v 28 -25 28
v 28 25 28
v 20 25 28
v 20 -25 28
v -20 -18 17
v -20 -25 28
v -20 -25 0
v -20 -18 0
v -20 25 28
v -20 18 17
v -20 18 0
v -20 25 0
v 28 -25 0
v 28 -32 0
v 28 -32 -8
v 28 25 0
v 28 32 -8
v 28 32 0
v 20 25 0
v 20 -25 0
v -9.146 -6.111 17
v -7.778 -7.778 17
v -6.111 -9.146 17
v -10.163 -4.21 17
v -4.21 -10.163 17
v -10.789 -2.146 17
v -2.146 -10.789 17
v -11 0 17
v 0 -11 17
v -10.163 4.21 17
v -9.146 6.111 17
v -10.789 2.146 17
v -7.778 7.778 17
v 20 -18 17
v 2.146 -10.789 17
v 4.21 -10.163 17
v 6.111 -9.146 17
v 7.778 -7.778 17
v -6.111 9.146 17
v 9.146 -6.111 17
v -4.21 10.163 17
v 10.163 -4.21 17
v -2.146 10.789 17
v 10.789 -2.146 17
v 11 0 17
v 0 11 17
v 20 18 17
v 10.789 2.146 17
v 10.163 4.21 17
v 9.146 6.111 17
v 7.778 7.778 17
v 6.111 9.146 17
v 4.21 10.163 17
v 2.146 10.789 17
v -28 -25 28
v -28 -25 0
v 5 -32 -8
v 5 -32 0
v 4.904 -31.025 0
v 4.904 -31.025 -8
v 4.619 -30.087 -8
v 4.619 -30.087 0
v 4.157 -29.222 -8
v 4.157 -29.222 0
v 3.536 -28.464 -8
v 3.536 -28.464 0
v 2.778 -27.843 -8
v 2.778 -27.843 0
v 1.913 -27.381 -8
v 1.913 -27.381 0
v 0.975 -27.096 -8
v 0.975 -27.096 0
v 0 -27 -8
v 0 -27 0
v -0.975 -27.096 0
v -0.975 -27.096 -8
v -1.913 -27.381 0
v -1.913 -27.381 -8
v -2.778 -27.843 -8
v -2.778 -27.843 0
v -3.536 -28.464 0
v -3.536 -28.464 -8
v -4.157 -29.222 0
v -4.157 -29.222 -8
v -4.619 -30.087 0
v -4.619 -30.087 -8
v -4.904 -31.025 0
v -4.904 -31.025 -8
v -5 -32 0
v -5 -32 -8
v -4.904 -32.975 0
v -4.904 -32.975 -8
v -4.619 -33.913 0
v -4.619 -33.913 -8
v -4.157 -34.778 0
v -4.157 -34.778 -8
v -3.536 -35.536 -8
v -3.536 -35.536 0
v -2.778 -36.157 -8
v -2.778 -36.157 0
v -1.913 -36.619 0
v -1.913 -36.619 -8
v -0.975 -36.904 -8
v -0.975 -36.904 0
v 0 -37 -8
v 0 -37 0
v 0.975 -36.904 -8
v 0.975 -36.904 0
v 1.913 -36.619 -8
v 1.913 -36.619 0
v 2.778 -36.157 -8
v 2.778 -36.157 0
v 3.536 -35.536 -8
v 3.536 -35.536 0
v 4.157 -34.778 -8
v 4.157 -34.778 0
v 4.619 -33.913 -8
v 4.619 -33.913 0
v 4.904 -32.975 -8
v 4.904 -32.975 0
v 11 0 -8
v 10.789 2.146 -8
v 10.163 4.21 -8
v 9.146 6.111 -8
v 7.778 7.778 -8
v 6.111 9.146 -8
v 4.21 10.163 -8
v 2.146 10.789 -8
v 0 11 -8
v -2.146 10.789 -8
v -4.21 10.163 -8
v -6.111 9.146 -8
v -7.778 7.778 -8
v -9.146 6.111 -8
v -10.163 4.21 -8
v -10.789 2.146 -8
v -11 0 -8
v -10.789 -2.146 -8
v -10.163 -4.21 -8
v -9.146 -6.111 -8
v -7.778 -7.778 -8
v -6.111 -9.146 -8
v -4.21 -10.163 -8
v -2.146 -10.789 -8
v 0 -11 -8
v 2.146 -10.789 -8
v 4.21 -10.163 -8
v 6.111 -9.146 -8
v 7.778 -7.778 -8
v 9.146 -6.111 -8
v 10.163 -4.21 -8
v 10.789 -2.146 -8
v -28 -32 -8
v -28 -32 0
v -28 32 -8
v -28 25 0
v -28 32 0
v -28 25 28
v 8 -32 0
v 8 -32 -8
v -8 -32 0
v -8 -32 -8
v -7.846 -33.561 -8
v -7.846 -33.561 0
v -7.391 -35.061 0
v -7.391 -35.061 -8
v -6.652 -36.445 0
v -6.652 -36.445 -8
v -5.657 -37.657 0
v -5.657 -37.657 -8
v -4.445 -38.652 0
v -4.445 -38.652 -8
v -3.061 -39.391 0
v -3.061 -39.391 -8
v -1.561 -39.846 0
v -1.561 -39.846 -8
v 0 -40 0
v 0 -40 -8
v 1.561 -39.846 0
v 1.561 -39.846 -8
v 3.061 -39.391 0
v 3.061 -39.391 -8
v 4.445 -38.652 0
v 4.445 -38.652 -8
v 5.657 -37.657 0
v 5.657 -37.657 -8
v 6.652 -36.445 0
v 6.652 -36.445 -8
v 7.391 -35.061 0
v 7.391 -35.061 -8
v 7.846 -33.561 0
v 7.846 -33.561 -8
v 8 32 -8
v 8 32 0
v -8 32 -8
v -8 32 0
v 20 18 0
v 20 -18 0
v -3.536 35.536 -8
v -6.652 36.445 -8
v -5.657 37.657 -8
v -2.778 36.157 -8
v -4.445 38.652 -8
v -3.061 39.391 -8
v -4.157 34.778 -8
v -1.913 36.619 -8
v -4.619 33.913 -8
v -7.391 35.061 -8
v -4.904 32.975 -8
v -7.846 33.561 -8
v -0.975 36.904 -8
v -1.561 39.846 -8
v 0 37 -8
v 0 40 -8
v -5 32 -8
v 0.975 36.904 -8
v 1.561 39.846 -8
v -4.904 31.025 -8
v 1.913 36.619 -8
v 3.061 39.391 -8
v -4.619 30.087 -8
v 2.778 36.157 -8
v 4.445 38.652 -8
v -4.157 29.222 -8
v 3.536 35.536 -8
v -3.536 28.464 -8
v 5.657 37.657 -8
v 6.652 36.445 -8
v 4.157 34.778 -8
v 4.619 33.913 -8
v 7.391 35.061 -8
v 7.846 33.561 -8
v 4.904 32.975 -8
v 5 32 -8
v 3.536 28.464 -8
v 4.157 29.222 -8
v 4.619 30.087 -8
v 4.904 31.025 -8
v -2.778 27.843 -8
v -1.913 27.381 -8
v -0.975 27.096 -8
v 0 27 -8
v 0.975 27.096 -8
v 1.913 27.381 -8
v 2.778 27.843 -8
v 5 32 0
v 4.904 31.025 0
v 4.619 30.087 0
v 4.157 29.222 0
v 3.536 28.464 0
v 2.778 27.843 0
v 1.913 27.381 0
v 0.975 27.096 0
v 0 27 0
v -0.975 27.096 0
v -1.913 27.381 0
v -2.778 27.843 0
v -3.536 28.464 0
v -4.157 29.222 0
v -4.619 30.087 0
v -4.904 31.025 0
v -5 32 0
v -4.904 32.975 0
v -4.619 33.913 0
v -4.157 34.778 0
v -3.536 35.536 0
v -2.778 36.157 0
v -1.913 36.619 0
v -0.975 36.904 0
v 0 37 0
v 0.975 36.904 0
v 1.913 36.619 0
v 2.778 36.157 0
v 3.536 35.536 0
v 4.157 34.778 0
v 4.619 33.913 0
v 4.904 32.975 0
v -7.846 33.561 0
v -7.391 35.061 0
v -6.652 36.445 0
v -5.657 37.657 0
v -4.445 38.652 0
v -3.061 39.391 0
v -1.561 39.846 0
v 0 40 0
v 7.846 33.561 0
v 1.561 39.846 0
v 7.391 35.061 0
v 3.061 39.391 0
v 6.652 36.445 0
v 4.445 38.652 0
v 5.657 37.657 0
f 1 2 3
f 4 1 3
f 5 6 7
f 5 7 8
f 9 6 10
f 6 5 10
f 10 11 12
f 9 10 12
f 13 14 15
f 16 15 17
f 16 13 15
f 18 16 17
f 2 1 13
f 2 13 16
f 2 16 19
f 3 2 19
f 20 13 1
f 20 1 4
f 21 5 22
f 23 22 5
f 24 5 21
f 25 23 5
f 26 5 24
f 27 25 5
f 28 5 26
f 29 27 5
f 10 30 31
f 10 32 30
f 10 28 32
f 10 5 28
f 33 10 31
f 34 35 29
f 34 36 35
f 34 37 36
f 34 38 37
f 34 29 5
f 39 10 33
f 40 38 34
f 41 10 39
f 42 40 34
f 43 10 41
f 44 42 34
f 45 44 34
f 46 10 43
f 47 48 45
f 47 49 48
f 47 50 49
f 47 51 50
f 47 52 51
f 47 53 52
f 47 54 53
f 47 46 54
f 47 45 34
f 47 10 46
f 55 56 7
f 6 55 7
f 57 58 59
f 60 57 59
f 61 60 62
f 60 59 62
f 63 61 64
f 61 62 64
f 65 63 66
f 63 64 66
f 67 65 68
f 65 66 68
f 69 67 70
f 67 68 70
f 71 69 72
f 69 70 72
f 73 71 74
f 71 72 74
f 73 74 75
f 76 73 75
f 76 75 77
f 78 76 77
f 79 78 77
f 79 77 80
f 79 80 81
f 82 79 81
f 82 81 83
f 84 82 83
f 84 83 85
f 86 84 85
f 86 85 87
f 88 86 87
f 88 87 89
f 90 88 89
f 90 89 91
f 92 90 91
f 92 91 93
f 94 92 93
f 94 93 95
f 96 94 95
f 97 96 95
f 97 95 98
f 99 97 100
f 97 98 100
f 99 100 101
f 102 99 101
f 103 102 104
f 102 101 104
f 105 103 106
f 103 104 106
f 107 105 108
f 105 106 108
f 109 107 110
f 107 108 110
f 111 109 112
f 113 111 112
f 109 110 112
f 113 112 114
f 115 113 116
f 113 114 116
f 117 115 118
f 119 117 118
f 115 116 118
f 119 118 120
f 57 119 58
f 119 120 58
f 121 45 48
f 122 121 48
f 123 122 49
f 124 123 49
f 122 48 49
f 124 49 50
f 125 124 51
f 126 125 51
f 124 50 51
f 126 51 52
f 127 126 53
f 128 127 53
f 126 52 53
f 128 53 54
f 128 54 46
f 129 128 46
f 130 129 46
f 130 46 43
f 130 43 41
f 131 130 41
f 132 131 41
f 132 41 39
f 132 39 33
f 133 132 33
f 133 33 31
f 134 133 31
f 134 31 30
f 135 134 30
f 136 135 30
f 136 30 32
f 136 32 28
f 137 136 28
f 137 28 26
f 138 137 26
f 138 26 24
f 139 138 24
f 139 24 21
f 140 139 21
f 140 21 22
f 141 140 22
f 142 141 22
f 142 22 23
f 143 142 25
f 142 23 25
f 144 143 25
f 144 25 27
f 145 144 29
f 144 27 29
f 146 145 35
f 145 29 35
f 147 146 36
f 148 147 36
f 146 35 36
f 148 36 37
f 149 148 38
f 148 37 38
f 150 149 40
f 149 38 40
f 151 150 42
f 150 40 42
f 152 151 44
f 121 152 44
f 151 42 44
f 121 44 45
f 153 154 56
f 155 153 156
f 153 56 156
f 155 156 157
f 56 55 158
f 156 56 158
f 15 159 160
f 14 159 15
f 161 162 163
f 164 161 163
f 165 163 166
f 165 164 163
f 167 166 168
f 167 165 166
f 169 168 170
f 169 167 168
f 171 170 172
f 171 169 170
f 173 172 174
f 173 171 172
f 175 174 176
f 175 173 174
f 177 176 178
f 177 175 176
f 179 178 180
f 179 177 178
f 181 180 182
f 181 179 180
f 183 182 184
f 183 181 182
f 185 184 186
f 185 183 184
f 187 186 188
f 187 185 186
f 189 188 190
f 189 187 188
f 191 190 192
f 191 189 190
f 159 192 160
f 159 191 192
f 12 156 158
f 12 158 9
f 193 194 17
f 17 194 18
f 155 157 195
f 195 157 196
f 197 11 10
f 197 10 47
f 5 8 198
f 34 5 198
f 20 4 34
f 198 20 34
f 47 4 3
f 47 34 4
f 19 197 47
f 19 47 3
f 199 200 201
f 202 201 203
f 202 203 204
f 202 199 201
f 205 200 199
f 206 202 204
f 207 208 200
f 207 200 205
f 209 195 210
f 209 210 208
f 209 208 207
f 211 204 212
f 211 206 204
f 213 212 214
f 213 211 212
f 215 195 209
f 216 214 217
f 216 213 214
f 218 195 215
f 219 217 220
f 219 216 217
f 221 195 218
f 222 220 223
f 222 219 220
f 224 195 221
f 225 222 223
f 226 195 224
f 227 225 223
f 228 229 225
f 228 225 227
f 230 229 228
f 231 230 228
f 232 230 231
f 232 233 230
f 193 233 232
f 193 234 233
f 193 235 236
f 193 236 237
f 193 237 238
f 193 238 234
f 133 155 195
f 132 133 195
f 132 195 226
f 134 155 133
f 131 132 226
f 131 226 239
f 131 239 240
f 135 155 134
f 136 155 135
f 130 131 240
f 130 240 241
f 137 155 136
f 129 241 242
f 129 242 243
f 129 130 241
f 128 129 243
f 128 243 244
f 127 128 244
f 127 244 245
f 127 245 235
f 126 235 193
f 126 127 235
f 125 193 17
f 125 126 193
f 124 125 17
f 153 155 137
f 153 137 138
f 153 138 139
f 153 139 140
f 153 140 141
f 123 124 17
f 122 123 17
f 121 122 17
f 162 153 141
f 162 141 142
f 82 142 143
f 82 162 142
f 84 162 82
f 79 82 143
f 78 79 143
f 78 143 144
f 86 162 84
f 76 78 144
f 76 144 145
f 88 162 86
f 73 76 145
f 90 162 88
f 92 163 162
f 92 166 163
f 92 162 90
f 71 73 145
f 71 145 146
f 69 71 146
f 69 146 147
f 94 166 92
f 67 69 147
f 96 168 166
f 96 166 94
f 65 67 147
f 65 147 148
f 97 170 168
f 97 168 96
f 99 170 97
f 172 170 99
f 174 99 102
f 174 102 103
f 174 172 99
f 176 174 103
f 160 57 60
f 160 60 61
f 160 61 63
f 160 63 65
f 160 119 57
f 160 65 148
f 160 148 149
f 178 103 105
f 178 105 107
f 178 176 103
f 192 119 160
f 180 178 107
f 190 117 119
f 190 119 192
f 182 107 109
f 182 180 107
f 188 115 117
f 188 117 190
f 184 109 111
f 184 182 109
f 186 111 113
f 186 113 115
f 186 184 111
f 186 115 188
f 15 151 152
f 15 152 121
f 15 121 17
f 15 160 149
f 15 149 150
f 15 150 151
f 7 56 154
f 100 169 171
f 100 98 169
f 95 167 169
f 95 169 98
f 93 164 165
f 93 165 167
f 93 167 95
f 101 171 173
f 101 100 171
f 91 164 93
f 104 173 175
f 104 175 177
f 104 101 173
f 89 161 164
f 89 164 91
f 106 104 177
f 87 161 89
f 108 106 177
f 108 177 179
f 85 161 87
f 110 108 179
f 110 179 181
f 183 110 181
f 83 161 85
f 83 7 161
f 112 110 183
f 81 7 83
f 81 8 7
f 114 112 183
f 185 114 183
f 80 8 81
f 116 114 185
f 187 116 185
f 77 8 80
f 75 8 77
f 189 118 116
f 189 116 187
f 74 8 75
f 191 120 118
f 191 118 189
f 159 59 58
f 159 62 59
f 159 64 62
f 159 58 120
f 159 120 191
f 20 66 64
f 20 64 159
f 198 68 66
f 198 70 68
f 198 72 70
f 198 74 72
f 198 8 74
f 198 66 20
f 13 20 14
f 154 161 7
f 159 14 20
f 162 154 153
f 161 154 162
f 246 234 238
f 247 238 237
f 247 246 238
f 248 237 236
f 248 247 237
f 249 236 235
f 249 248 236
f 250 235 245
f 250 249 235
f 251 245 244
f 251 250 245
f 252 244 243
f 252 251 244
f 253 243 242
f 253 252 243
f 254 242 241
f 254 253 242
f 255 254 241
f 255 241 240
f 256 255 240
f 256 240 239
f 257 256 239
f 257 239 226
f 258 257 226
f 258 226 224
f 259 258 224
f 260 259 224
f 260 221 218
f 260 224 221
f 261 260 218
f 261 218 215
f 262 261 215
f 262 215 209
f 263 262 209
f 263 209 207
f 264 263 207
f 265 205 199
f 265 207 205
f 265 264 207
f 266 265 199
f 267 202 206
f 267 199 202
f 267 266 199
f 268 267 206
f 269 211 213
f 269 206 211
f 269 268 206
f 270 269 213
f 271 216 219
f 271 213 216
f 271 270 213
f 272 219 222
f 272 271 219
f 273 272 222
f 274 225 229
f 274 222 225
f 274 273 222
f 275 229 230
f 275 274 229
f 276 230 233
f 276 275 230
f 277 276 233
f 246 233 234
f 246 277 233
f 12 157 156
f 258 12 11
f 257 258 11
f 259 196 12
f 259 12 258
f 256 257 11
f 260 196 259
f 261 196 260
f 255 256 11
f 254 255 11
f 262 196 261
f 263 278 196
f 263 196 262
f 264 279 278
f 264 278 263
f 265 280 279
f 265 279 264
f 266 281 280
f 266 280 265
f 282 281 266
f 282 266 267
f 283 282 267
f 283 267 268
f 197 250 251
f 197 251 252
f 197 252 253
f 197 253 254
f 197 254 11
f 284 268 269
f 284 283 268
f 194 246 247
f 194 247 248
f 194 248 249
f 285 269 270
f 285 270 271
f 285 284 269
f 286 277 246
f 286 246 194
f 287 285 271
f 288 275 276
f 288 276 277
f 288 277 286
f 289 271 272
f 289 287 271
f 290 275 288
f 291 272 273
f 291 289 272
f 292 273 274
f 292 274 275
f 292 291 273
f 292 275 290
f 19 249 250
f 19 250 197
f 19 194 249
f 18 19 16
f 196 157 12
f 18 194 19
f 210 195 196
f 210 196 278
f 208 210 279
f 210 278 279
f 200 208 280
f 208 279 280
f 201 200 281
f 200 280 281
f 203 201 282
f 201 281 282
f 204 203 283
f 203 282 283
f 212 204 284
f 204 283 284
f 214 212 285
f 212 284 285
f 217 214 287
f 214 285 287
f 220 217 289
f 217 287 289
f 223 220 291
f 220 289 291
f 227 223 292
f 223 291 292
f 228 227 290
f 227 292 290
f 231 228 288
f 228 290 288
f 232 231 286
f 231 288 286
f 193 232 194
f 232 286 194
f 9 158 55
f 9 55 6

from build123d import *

# Parameters (mm, degrees)
F0_W      = 56
F0_H      = 64
F1_DEPTH  = 8
F2_W      = 8
F2_H      = 50
F3_DEPTH  = 28
F4_R      = 8
F5_DEPTH  = 8
F6_R      = 5
F7_DEPTH  = 8.001
F8_W      = 40
F8_H      = 36
F9_DEPTH  = 17
F10_R     = 11
F11_DEPTH = 25.001


# Not quite as in the source:
# - a pattern or mirror of a feature is missing from the dataset's text; its kind, count and spacing are read off the source's solid


with BuildPart() as f1:
    # F0 (on Top) → F1 (new body)
    with BuildSketch(Plane.XY):
        Rectangle(F0_W, F0_H)
    extrude(amount=-F1_DEPTH)

    # F2 (on face) → F3 (join)
    with BuildSketch(Plane.XY):
        with Locations((-24, 0)):
            Rectangle(F2_W, F2_H)
    f3 = extrude(amount=F3_DEPTH)

    # F3_copies: F3 across plane
    add(f3.mirror(Plane(origin=(0, 0, 0), x_dir=(0, 0, 1), z_dir=(1, 0, 0))))

    # F4 (on face) → F5 (join, through all)
    with BuildSketch(Plane.XY):
        with Locations((0, -32)):
            Circle(F4_R)
    f5 = extrude(amount=-F5_DEPTH)

    # F5_copies: F5 across plane
    add(f5.mirror(Plane.ZX))

    # F6 (on face) → F7 (cut, through all)
    with BuildSketch(Plane.XY):
        with Locations((0, -32)):
            Circle(F6_R)
    f7 = extrude(amount=-F7_DEPTH, mode=Mode.SUBTRACT)

    # F7_copies: F7 across plane
    add(f7.mirror(Plane.ZX), mode=Mode.SUBTRACT)

    # F8 (on face) → F9 (join)
    with BuildSketch(Plane.XY):
        Rectangle(F8_W, F8_H)
    extrude(amount=F9_DEPTH)

    # F10 (on face) → F11 (cut, through all)
    with BuildSketch(Plane.XY.offset(17)):
        Circle(F10_R)
    extrude(amount=-F11_DEPTH, mode=Mode.SUBTRACT)


solid = f1.part
